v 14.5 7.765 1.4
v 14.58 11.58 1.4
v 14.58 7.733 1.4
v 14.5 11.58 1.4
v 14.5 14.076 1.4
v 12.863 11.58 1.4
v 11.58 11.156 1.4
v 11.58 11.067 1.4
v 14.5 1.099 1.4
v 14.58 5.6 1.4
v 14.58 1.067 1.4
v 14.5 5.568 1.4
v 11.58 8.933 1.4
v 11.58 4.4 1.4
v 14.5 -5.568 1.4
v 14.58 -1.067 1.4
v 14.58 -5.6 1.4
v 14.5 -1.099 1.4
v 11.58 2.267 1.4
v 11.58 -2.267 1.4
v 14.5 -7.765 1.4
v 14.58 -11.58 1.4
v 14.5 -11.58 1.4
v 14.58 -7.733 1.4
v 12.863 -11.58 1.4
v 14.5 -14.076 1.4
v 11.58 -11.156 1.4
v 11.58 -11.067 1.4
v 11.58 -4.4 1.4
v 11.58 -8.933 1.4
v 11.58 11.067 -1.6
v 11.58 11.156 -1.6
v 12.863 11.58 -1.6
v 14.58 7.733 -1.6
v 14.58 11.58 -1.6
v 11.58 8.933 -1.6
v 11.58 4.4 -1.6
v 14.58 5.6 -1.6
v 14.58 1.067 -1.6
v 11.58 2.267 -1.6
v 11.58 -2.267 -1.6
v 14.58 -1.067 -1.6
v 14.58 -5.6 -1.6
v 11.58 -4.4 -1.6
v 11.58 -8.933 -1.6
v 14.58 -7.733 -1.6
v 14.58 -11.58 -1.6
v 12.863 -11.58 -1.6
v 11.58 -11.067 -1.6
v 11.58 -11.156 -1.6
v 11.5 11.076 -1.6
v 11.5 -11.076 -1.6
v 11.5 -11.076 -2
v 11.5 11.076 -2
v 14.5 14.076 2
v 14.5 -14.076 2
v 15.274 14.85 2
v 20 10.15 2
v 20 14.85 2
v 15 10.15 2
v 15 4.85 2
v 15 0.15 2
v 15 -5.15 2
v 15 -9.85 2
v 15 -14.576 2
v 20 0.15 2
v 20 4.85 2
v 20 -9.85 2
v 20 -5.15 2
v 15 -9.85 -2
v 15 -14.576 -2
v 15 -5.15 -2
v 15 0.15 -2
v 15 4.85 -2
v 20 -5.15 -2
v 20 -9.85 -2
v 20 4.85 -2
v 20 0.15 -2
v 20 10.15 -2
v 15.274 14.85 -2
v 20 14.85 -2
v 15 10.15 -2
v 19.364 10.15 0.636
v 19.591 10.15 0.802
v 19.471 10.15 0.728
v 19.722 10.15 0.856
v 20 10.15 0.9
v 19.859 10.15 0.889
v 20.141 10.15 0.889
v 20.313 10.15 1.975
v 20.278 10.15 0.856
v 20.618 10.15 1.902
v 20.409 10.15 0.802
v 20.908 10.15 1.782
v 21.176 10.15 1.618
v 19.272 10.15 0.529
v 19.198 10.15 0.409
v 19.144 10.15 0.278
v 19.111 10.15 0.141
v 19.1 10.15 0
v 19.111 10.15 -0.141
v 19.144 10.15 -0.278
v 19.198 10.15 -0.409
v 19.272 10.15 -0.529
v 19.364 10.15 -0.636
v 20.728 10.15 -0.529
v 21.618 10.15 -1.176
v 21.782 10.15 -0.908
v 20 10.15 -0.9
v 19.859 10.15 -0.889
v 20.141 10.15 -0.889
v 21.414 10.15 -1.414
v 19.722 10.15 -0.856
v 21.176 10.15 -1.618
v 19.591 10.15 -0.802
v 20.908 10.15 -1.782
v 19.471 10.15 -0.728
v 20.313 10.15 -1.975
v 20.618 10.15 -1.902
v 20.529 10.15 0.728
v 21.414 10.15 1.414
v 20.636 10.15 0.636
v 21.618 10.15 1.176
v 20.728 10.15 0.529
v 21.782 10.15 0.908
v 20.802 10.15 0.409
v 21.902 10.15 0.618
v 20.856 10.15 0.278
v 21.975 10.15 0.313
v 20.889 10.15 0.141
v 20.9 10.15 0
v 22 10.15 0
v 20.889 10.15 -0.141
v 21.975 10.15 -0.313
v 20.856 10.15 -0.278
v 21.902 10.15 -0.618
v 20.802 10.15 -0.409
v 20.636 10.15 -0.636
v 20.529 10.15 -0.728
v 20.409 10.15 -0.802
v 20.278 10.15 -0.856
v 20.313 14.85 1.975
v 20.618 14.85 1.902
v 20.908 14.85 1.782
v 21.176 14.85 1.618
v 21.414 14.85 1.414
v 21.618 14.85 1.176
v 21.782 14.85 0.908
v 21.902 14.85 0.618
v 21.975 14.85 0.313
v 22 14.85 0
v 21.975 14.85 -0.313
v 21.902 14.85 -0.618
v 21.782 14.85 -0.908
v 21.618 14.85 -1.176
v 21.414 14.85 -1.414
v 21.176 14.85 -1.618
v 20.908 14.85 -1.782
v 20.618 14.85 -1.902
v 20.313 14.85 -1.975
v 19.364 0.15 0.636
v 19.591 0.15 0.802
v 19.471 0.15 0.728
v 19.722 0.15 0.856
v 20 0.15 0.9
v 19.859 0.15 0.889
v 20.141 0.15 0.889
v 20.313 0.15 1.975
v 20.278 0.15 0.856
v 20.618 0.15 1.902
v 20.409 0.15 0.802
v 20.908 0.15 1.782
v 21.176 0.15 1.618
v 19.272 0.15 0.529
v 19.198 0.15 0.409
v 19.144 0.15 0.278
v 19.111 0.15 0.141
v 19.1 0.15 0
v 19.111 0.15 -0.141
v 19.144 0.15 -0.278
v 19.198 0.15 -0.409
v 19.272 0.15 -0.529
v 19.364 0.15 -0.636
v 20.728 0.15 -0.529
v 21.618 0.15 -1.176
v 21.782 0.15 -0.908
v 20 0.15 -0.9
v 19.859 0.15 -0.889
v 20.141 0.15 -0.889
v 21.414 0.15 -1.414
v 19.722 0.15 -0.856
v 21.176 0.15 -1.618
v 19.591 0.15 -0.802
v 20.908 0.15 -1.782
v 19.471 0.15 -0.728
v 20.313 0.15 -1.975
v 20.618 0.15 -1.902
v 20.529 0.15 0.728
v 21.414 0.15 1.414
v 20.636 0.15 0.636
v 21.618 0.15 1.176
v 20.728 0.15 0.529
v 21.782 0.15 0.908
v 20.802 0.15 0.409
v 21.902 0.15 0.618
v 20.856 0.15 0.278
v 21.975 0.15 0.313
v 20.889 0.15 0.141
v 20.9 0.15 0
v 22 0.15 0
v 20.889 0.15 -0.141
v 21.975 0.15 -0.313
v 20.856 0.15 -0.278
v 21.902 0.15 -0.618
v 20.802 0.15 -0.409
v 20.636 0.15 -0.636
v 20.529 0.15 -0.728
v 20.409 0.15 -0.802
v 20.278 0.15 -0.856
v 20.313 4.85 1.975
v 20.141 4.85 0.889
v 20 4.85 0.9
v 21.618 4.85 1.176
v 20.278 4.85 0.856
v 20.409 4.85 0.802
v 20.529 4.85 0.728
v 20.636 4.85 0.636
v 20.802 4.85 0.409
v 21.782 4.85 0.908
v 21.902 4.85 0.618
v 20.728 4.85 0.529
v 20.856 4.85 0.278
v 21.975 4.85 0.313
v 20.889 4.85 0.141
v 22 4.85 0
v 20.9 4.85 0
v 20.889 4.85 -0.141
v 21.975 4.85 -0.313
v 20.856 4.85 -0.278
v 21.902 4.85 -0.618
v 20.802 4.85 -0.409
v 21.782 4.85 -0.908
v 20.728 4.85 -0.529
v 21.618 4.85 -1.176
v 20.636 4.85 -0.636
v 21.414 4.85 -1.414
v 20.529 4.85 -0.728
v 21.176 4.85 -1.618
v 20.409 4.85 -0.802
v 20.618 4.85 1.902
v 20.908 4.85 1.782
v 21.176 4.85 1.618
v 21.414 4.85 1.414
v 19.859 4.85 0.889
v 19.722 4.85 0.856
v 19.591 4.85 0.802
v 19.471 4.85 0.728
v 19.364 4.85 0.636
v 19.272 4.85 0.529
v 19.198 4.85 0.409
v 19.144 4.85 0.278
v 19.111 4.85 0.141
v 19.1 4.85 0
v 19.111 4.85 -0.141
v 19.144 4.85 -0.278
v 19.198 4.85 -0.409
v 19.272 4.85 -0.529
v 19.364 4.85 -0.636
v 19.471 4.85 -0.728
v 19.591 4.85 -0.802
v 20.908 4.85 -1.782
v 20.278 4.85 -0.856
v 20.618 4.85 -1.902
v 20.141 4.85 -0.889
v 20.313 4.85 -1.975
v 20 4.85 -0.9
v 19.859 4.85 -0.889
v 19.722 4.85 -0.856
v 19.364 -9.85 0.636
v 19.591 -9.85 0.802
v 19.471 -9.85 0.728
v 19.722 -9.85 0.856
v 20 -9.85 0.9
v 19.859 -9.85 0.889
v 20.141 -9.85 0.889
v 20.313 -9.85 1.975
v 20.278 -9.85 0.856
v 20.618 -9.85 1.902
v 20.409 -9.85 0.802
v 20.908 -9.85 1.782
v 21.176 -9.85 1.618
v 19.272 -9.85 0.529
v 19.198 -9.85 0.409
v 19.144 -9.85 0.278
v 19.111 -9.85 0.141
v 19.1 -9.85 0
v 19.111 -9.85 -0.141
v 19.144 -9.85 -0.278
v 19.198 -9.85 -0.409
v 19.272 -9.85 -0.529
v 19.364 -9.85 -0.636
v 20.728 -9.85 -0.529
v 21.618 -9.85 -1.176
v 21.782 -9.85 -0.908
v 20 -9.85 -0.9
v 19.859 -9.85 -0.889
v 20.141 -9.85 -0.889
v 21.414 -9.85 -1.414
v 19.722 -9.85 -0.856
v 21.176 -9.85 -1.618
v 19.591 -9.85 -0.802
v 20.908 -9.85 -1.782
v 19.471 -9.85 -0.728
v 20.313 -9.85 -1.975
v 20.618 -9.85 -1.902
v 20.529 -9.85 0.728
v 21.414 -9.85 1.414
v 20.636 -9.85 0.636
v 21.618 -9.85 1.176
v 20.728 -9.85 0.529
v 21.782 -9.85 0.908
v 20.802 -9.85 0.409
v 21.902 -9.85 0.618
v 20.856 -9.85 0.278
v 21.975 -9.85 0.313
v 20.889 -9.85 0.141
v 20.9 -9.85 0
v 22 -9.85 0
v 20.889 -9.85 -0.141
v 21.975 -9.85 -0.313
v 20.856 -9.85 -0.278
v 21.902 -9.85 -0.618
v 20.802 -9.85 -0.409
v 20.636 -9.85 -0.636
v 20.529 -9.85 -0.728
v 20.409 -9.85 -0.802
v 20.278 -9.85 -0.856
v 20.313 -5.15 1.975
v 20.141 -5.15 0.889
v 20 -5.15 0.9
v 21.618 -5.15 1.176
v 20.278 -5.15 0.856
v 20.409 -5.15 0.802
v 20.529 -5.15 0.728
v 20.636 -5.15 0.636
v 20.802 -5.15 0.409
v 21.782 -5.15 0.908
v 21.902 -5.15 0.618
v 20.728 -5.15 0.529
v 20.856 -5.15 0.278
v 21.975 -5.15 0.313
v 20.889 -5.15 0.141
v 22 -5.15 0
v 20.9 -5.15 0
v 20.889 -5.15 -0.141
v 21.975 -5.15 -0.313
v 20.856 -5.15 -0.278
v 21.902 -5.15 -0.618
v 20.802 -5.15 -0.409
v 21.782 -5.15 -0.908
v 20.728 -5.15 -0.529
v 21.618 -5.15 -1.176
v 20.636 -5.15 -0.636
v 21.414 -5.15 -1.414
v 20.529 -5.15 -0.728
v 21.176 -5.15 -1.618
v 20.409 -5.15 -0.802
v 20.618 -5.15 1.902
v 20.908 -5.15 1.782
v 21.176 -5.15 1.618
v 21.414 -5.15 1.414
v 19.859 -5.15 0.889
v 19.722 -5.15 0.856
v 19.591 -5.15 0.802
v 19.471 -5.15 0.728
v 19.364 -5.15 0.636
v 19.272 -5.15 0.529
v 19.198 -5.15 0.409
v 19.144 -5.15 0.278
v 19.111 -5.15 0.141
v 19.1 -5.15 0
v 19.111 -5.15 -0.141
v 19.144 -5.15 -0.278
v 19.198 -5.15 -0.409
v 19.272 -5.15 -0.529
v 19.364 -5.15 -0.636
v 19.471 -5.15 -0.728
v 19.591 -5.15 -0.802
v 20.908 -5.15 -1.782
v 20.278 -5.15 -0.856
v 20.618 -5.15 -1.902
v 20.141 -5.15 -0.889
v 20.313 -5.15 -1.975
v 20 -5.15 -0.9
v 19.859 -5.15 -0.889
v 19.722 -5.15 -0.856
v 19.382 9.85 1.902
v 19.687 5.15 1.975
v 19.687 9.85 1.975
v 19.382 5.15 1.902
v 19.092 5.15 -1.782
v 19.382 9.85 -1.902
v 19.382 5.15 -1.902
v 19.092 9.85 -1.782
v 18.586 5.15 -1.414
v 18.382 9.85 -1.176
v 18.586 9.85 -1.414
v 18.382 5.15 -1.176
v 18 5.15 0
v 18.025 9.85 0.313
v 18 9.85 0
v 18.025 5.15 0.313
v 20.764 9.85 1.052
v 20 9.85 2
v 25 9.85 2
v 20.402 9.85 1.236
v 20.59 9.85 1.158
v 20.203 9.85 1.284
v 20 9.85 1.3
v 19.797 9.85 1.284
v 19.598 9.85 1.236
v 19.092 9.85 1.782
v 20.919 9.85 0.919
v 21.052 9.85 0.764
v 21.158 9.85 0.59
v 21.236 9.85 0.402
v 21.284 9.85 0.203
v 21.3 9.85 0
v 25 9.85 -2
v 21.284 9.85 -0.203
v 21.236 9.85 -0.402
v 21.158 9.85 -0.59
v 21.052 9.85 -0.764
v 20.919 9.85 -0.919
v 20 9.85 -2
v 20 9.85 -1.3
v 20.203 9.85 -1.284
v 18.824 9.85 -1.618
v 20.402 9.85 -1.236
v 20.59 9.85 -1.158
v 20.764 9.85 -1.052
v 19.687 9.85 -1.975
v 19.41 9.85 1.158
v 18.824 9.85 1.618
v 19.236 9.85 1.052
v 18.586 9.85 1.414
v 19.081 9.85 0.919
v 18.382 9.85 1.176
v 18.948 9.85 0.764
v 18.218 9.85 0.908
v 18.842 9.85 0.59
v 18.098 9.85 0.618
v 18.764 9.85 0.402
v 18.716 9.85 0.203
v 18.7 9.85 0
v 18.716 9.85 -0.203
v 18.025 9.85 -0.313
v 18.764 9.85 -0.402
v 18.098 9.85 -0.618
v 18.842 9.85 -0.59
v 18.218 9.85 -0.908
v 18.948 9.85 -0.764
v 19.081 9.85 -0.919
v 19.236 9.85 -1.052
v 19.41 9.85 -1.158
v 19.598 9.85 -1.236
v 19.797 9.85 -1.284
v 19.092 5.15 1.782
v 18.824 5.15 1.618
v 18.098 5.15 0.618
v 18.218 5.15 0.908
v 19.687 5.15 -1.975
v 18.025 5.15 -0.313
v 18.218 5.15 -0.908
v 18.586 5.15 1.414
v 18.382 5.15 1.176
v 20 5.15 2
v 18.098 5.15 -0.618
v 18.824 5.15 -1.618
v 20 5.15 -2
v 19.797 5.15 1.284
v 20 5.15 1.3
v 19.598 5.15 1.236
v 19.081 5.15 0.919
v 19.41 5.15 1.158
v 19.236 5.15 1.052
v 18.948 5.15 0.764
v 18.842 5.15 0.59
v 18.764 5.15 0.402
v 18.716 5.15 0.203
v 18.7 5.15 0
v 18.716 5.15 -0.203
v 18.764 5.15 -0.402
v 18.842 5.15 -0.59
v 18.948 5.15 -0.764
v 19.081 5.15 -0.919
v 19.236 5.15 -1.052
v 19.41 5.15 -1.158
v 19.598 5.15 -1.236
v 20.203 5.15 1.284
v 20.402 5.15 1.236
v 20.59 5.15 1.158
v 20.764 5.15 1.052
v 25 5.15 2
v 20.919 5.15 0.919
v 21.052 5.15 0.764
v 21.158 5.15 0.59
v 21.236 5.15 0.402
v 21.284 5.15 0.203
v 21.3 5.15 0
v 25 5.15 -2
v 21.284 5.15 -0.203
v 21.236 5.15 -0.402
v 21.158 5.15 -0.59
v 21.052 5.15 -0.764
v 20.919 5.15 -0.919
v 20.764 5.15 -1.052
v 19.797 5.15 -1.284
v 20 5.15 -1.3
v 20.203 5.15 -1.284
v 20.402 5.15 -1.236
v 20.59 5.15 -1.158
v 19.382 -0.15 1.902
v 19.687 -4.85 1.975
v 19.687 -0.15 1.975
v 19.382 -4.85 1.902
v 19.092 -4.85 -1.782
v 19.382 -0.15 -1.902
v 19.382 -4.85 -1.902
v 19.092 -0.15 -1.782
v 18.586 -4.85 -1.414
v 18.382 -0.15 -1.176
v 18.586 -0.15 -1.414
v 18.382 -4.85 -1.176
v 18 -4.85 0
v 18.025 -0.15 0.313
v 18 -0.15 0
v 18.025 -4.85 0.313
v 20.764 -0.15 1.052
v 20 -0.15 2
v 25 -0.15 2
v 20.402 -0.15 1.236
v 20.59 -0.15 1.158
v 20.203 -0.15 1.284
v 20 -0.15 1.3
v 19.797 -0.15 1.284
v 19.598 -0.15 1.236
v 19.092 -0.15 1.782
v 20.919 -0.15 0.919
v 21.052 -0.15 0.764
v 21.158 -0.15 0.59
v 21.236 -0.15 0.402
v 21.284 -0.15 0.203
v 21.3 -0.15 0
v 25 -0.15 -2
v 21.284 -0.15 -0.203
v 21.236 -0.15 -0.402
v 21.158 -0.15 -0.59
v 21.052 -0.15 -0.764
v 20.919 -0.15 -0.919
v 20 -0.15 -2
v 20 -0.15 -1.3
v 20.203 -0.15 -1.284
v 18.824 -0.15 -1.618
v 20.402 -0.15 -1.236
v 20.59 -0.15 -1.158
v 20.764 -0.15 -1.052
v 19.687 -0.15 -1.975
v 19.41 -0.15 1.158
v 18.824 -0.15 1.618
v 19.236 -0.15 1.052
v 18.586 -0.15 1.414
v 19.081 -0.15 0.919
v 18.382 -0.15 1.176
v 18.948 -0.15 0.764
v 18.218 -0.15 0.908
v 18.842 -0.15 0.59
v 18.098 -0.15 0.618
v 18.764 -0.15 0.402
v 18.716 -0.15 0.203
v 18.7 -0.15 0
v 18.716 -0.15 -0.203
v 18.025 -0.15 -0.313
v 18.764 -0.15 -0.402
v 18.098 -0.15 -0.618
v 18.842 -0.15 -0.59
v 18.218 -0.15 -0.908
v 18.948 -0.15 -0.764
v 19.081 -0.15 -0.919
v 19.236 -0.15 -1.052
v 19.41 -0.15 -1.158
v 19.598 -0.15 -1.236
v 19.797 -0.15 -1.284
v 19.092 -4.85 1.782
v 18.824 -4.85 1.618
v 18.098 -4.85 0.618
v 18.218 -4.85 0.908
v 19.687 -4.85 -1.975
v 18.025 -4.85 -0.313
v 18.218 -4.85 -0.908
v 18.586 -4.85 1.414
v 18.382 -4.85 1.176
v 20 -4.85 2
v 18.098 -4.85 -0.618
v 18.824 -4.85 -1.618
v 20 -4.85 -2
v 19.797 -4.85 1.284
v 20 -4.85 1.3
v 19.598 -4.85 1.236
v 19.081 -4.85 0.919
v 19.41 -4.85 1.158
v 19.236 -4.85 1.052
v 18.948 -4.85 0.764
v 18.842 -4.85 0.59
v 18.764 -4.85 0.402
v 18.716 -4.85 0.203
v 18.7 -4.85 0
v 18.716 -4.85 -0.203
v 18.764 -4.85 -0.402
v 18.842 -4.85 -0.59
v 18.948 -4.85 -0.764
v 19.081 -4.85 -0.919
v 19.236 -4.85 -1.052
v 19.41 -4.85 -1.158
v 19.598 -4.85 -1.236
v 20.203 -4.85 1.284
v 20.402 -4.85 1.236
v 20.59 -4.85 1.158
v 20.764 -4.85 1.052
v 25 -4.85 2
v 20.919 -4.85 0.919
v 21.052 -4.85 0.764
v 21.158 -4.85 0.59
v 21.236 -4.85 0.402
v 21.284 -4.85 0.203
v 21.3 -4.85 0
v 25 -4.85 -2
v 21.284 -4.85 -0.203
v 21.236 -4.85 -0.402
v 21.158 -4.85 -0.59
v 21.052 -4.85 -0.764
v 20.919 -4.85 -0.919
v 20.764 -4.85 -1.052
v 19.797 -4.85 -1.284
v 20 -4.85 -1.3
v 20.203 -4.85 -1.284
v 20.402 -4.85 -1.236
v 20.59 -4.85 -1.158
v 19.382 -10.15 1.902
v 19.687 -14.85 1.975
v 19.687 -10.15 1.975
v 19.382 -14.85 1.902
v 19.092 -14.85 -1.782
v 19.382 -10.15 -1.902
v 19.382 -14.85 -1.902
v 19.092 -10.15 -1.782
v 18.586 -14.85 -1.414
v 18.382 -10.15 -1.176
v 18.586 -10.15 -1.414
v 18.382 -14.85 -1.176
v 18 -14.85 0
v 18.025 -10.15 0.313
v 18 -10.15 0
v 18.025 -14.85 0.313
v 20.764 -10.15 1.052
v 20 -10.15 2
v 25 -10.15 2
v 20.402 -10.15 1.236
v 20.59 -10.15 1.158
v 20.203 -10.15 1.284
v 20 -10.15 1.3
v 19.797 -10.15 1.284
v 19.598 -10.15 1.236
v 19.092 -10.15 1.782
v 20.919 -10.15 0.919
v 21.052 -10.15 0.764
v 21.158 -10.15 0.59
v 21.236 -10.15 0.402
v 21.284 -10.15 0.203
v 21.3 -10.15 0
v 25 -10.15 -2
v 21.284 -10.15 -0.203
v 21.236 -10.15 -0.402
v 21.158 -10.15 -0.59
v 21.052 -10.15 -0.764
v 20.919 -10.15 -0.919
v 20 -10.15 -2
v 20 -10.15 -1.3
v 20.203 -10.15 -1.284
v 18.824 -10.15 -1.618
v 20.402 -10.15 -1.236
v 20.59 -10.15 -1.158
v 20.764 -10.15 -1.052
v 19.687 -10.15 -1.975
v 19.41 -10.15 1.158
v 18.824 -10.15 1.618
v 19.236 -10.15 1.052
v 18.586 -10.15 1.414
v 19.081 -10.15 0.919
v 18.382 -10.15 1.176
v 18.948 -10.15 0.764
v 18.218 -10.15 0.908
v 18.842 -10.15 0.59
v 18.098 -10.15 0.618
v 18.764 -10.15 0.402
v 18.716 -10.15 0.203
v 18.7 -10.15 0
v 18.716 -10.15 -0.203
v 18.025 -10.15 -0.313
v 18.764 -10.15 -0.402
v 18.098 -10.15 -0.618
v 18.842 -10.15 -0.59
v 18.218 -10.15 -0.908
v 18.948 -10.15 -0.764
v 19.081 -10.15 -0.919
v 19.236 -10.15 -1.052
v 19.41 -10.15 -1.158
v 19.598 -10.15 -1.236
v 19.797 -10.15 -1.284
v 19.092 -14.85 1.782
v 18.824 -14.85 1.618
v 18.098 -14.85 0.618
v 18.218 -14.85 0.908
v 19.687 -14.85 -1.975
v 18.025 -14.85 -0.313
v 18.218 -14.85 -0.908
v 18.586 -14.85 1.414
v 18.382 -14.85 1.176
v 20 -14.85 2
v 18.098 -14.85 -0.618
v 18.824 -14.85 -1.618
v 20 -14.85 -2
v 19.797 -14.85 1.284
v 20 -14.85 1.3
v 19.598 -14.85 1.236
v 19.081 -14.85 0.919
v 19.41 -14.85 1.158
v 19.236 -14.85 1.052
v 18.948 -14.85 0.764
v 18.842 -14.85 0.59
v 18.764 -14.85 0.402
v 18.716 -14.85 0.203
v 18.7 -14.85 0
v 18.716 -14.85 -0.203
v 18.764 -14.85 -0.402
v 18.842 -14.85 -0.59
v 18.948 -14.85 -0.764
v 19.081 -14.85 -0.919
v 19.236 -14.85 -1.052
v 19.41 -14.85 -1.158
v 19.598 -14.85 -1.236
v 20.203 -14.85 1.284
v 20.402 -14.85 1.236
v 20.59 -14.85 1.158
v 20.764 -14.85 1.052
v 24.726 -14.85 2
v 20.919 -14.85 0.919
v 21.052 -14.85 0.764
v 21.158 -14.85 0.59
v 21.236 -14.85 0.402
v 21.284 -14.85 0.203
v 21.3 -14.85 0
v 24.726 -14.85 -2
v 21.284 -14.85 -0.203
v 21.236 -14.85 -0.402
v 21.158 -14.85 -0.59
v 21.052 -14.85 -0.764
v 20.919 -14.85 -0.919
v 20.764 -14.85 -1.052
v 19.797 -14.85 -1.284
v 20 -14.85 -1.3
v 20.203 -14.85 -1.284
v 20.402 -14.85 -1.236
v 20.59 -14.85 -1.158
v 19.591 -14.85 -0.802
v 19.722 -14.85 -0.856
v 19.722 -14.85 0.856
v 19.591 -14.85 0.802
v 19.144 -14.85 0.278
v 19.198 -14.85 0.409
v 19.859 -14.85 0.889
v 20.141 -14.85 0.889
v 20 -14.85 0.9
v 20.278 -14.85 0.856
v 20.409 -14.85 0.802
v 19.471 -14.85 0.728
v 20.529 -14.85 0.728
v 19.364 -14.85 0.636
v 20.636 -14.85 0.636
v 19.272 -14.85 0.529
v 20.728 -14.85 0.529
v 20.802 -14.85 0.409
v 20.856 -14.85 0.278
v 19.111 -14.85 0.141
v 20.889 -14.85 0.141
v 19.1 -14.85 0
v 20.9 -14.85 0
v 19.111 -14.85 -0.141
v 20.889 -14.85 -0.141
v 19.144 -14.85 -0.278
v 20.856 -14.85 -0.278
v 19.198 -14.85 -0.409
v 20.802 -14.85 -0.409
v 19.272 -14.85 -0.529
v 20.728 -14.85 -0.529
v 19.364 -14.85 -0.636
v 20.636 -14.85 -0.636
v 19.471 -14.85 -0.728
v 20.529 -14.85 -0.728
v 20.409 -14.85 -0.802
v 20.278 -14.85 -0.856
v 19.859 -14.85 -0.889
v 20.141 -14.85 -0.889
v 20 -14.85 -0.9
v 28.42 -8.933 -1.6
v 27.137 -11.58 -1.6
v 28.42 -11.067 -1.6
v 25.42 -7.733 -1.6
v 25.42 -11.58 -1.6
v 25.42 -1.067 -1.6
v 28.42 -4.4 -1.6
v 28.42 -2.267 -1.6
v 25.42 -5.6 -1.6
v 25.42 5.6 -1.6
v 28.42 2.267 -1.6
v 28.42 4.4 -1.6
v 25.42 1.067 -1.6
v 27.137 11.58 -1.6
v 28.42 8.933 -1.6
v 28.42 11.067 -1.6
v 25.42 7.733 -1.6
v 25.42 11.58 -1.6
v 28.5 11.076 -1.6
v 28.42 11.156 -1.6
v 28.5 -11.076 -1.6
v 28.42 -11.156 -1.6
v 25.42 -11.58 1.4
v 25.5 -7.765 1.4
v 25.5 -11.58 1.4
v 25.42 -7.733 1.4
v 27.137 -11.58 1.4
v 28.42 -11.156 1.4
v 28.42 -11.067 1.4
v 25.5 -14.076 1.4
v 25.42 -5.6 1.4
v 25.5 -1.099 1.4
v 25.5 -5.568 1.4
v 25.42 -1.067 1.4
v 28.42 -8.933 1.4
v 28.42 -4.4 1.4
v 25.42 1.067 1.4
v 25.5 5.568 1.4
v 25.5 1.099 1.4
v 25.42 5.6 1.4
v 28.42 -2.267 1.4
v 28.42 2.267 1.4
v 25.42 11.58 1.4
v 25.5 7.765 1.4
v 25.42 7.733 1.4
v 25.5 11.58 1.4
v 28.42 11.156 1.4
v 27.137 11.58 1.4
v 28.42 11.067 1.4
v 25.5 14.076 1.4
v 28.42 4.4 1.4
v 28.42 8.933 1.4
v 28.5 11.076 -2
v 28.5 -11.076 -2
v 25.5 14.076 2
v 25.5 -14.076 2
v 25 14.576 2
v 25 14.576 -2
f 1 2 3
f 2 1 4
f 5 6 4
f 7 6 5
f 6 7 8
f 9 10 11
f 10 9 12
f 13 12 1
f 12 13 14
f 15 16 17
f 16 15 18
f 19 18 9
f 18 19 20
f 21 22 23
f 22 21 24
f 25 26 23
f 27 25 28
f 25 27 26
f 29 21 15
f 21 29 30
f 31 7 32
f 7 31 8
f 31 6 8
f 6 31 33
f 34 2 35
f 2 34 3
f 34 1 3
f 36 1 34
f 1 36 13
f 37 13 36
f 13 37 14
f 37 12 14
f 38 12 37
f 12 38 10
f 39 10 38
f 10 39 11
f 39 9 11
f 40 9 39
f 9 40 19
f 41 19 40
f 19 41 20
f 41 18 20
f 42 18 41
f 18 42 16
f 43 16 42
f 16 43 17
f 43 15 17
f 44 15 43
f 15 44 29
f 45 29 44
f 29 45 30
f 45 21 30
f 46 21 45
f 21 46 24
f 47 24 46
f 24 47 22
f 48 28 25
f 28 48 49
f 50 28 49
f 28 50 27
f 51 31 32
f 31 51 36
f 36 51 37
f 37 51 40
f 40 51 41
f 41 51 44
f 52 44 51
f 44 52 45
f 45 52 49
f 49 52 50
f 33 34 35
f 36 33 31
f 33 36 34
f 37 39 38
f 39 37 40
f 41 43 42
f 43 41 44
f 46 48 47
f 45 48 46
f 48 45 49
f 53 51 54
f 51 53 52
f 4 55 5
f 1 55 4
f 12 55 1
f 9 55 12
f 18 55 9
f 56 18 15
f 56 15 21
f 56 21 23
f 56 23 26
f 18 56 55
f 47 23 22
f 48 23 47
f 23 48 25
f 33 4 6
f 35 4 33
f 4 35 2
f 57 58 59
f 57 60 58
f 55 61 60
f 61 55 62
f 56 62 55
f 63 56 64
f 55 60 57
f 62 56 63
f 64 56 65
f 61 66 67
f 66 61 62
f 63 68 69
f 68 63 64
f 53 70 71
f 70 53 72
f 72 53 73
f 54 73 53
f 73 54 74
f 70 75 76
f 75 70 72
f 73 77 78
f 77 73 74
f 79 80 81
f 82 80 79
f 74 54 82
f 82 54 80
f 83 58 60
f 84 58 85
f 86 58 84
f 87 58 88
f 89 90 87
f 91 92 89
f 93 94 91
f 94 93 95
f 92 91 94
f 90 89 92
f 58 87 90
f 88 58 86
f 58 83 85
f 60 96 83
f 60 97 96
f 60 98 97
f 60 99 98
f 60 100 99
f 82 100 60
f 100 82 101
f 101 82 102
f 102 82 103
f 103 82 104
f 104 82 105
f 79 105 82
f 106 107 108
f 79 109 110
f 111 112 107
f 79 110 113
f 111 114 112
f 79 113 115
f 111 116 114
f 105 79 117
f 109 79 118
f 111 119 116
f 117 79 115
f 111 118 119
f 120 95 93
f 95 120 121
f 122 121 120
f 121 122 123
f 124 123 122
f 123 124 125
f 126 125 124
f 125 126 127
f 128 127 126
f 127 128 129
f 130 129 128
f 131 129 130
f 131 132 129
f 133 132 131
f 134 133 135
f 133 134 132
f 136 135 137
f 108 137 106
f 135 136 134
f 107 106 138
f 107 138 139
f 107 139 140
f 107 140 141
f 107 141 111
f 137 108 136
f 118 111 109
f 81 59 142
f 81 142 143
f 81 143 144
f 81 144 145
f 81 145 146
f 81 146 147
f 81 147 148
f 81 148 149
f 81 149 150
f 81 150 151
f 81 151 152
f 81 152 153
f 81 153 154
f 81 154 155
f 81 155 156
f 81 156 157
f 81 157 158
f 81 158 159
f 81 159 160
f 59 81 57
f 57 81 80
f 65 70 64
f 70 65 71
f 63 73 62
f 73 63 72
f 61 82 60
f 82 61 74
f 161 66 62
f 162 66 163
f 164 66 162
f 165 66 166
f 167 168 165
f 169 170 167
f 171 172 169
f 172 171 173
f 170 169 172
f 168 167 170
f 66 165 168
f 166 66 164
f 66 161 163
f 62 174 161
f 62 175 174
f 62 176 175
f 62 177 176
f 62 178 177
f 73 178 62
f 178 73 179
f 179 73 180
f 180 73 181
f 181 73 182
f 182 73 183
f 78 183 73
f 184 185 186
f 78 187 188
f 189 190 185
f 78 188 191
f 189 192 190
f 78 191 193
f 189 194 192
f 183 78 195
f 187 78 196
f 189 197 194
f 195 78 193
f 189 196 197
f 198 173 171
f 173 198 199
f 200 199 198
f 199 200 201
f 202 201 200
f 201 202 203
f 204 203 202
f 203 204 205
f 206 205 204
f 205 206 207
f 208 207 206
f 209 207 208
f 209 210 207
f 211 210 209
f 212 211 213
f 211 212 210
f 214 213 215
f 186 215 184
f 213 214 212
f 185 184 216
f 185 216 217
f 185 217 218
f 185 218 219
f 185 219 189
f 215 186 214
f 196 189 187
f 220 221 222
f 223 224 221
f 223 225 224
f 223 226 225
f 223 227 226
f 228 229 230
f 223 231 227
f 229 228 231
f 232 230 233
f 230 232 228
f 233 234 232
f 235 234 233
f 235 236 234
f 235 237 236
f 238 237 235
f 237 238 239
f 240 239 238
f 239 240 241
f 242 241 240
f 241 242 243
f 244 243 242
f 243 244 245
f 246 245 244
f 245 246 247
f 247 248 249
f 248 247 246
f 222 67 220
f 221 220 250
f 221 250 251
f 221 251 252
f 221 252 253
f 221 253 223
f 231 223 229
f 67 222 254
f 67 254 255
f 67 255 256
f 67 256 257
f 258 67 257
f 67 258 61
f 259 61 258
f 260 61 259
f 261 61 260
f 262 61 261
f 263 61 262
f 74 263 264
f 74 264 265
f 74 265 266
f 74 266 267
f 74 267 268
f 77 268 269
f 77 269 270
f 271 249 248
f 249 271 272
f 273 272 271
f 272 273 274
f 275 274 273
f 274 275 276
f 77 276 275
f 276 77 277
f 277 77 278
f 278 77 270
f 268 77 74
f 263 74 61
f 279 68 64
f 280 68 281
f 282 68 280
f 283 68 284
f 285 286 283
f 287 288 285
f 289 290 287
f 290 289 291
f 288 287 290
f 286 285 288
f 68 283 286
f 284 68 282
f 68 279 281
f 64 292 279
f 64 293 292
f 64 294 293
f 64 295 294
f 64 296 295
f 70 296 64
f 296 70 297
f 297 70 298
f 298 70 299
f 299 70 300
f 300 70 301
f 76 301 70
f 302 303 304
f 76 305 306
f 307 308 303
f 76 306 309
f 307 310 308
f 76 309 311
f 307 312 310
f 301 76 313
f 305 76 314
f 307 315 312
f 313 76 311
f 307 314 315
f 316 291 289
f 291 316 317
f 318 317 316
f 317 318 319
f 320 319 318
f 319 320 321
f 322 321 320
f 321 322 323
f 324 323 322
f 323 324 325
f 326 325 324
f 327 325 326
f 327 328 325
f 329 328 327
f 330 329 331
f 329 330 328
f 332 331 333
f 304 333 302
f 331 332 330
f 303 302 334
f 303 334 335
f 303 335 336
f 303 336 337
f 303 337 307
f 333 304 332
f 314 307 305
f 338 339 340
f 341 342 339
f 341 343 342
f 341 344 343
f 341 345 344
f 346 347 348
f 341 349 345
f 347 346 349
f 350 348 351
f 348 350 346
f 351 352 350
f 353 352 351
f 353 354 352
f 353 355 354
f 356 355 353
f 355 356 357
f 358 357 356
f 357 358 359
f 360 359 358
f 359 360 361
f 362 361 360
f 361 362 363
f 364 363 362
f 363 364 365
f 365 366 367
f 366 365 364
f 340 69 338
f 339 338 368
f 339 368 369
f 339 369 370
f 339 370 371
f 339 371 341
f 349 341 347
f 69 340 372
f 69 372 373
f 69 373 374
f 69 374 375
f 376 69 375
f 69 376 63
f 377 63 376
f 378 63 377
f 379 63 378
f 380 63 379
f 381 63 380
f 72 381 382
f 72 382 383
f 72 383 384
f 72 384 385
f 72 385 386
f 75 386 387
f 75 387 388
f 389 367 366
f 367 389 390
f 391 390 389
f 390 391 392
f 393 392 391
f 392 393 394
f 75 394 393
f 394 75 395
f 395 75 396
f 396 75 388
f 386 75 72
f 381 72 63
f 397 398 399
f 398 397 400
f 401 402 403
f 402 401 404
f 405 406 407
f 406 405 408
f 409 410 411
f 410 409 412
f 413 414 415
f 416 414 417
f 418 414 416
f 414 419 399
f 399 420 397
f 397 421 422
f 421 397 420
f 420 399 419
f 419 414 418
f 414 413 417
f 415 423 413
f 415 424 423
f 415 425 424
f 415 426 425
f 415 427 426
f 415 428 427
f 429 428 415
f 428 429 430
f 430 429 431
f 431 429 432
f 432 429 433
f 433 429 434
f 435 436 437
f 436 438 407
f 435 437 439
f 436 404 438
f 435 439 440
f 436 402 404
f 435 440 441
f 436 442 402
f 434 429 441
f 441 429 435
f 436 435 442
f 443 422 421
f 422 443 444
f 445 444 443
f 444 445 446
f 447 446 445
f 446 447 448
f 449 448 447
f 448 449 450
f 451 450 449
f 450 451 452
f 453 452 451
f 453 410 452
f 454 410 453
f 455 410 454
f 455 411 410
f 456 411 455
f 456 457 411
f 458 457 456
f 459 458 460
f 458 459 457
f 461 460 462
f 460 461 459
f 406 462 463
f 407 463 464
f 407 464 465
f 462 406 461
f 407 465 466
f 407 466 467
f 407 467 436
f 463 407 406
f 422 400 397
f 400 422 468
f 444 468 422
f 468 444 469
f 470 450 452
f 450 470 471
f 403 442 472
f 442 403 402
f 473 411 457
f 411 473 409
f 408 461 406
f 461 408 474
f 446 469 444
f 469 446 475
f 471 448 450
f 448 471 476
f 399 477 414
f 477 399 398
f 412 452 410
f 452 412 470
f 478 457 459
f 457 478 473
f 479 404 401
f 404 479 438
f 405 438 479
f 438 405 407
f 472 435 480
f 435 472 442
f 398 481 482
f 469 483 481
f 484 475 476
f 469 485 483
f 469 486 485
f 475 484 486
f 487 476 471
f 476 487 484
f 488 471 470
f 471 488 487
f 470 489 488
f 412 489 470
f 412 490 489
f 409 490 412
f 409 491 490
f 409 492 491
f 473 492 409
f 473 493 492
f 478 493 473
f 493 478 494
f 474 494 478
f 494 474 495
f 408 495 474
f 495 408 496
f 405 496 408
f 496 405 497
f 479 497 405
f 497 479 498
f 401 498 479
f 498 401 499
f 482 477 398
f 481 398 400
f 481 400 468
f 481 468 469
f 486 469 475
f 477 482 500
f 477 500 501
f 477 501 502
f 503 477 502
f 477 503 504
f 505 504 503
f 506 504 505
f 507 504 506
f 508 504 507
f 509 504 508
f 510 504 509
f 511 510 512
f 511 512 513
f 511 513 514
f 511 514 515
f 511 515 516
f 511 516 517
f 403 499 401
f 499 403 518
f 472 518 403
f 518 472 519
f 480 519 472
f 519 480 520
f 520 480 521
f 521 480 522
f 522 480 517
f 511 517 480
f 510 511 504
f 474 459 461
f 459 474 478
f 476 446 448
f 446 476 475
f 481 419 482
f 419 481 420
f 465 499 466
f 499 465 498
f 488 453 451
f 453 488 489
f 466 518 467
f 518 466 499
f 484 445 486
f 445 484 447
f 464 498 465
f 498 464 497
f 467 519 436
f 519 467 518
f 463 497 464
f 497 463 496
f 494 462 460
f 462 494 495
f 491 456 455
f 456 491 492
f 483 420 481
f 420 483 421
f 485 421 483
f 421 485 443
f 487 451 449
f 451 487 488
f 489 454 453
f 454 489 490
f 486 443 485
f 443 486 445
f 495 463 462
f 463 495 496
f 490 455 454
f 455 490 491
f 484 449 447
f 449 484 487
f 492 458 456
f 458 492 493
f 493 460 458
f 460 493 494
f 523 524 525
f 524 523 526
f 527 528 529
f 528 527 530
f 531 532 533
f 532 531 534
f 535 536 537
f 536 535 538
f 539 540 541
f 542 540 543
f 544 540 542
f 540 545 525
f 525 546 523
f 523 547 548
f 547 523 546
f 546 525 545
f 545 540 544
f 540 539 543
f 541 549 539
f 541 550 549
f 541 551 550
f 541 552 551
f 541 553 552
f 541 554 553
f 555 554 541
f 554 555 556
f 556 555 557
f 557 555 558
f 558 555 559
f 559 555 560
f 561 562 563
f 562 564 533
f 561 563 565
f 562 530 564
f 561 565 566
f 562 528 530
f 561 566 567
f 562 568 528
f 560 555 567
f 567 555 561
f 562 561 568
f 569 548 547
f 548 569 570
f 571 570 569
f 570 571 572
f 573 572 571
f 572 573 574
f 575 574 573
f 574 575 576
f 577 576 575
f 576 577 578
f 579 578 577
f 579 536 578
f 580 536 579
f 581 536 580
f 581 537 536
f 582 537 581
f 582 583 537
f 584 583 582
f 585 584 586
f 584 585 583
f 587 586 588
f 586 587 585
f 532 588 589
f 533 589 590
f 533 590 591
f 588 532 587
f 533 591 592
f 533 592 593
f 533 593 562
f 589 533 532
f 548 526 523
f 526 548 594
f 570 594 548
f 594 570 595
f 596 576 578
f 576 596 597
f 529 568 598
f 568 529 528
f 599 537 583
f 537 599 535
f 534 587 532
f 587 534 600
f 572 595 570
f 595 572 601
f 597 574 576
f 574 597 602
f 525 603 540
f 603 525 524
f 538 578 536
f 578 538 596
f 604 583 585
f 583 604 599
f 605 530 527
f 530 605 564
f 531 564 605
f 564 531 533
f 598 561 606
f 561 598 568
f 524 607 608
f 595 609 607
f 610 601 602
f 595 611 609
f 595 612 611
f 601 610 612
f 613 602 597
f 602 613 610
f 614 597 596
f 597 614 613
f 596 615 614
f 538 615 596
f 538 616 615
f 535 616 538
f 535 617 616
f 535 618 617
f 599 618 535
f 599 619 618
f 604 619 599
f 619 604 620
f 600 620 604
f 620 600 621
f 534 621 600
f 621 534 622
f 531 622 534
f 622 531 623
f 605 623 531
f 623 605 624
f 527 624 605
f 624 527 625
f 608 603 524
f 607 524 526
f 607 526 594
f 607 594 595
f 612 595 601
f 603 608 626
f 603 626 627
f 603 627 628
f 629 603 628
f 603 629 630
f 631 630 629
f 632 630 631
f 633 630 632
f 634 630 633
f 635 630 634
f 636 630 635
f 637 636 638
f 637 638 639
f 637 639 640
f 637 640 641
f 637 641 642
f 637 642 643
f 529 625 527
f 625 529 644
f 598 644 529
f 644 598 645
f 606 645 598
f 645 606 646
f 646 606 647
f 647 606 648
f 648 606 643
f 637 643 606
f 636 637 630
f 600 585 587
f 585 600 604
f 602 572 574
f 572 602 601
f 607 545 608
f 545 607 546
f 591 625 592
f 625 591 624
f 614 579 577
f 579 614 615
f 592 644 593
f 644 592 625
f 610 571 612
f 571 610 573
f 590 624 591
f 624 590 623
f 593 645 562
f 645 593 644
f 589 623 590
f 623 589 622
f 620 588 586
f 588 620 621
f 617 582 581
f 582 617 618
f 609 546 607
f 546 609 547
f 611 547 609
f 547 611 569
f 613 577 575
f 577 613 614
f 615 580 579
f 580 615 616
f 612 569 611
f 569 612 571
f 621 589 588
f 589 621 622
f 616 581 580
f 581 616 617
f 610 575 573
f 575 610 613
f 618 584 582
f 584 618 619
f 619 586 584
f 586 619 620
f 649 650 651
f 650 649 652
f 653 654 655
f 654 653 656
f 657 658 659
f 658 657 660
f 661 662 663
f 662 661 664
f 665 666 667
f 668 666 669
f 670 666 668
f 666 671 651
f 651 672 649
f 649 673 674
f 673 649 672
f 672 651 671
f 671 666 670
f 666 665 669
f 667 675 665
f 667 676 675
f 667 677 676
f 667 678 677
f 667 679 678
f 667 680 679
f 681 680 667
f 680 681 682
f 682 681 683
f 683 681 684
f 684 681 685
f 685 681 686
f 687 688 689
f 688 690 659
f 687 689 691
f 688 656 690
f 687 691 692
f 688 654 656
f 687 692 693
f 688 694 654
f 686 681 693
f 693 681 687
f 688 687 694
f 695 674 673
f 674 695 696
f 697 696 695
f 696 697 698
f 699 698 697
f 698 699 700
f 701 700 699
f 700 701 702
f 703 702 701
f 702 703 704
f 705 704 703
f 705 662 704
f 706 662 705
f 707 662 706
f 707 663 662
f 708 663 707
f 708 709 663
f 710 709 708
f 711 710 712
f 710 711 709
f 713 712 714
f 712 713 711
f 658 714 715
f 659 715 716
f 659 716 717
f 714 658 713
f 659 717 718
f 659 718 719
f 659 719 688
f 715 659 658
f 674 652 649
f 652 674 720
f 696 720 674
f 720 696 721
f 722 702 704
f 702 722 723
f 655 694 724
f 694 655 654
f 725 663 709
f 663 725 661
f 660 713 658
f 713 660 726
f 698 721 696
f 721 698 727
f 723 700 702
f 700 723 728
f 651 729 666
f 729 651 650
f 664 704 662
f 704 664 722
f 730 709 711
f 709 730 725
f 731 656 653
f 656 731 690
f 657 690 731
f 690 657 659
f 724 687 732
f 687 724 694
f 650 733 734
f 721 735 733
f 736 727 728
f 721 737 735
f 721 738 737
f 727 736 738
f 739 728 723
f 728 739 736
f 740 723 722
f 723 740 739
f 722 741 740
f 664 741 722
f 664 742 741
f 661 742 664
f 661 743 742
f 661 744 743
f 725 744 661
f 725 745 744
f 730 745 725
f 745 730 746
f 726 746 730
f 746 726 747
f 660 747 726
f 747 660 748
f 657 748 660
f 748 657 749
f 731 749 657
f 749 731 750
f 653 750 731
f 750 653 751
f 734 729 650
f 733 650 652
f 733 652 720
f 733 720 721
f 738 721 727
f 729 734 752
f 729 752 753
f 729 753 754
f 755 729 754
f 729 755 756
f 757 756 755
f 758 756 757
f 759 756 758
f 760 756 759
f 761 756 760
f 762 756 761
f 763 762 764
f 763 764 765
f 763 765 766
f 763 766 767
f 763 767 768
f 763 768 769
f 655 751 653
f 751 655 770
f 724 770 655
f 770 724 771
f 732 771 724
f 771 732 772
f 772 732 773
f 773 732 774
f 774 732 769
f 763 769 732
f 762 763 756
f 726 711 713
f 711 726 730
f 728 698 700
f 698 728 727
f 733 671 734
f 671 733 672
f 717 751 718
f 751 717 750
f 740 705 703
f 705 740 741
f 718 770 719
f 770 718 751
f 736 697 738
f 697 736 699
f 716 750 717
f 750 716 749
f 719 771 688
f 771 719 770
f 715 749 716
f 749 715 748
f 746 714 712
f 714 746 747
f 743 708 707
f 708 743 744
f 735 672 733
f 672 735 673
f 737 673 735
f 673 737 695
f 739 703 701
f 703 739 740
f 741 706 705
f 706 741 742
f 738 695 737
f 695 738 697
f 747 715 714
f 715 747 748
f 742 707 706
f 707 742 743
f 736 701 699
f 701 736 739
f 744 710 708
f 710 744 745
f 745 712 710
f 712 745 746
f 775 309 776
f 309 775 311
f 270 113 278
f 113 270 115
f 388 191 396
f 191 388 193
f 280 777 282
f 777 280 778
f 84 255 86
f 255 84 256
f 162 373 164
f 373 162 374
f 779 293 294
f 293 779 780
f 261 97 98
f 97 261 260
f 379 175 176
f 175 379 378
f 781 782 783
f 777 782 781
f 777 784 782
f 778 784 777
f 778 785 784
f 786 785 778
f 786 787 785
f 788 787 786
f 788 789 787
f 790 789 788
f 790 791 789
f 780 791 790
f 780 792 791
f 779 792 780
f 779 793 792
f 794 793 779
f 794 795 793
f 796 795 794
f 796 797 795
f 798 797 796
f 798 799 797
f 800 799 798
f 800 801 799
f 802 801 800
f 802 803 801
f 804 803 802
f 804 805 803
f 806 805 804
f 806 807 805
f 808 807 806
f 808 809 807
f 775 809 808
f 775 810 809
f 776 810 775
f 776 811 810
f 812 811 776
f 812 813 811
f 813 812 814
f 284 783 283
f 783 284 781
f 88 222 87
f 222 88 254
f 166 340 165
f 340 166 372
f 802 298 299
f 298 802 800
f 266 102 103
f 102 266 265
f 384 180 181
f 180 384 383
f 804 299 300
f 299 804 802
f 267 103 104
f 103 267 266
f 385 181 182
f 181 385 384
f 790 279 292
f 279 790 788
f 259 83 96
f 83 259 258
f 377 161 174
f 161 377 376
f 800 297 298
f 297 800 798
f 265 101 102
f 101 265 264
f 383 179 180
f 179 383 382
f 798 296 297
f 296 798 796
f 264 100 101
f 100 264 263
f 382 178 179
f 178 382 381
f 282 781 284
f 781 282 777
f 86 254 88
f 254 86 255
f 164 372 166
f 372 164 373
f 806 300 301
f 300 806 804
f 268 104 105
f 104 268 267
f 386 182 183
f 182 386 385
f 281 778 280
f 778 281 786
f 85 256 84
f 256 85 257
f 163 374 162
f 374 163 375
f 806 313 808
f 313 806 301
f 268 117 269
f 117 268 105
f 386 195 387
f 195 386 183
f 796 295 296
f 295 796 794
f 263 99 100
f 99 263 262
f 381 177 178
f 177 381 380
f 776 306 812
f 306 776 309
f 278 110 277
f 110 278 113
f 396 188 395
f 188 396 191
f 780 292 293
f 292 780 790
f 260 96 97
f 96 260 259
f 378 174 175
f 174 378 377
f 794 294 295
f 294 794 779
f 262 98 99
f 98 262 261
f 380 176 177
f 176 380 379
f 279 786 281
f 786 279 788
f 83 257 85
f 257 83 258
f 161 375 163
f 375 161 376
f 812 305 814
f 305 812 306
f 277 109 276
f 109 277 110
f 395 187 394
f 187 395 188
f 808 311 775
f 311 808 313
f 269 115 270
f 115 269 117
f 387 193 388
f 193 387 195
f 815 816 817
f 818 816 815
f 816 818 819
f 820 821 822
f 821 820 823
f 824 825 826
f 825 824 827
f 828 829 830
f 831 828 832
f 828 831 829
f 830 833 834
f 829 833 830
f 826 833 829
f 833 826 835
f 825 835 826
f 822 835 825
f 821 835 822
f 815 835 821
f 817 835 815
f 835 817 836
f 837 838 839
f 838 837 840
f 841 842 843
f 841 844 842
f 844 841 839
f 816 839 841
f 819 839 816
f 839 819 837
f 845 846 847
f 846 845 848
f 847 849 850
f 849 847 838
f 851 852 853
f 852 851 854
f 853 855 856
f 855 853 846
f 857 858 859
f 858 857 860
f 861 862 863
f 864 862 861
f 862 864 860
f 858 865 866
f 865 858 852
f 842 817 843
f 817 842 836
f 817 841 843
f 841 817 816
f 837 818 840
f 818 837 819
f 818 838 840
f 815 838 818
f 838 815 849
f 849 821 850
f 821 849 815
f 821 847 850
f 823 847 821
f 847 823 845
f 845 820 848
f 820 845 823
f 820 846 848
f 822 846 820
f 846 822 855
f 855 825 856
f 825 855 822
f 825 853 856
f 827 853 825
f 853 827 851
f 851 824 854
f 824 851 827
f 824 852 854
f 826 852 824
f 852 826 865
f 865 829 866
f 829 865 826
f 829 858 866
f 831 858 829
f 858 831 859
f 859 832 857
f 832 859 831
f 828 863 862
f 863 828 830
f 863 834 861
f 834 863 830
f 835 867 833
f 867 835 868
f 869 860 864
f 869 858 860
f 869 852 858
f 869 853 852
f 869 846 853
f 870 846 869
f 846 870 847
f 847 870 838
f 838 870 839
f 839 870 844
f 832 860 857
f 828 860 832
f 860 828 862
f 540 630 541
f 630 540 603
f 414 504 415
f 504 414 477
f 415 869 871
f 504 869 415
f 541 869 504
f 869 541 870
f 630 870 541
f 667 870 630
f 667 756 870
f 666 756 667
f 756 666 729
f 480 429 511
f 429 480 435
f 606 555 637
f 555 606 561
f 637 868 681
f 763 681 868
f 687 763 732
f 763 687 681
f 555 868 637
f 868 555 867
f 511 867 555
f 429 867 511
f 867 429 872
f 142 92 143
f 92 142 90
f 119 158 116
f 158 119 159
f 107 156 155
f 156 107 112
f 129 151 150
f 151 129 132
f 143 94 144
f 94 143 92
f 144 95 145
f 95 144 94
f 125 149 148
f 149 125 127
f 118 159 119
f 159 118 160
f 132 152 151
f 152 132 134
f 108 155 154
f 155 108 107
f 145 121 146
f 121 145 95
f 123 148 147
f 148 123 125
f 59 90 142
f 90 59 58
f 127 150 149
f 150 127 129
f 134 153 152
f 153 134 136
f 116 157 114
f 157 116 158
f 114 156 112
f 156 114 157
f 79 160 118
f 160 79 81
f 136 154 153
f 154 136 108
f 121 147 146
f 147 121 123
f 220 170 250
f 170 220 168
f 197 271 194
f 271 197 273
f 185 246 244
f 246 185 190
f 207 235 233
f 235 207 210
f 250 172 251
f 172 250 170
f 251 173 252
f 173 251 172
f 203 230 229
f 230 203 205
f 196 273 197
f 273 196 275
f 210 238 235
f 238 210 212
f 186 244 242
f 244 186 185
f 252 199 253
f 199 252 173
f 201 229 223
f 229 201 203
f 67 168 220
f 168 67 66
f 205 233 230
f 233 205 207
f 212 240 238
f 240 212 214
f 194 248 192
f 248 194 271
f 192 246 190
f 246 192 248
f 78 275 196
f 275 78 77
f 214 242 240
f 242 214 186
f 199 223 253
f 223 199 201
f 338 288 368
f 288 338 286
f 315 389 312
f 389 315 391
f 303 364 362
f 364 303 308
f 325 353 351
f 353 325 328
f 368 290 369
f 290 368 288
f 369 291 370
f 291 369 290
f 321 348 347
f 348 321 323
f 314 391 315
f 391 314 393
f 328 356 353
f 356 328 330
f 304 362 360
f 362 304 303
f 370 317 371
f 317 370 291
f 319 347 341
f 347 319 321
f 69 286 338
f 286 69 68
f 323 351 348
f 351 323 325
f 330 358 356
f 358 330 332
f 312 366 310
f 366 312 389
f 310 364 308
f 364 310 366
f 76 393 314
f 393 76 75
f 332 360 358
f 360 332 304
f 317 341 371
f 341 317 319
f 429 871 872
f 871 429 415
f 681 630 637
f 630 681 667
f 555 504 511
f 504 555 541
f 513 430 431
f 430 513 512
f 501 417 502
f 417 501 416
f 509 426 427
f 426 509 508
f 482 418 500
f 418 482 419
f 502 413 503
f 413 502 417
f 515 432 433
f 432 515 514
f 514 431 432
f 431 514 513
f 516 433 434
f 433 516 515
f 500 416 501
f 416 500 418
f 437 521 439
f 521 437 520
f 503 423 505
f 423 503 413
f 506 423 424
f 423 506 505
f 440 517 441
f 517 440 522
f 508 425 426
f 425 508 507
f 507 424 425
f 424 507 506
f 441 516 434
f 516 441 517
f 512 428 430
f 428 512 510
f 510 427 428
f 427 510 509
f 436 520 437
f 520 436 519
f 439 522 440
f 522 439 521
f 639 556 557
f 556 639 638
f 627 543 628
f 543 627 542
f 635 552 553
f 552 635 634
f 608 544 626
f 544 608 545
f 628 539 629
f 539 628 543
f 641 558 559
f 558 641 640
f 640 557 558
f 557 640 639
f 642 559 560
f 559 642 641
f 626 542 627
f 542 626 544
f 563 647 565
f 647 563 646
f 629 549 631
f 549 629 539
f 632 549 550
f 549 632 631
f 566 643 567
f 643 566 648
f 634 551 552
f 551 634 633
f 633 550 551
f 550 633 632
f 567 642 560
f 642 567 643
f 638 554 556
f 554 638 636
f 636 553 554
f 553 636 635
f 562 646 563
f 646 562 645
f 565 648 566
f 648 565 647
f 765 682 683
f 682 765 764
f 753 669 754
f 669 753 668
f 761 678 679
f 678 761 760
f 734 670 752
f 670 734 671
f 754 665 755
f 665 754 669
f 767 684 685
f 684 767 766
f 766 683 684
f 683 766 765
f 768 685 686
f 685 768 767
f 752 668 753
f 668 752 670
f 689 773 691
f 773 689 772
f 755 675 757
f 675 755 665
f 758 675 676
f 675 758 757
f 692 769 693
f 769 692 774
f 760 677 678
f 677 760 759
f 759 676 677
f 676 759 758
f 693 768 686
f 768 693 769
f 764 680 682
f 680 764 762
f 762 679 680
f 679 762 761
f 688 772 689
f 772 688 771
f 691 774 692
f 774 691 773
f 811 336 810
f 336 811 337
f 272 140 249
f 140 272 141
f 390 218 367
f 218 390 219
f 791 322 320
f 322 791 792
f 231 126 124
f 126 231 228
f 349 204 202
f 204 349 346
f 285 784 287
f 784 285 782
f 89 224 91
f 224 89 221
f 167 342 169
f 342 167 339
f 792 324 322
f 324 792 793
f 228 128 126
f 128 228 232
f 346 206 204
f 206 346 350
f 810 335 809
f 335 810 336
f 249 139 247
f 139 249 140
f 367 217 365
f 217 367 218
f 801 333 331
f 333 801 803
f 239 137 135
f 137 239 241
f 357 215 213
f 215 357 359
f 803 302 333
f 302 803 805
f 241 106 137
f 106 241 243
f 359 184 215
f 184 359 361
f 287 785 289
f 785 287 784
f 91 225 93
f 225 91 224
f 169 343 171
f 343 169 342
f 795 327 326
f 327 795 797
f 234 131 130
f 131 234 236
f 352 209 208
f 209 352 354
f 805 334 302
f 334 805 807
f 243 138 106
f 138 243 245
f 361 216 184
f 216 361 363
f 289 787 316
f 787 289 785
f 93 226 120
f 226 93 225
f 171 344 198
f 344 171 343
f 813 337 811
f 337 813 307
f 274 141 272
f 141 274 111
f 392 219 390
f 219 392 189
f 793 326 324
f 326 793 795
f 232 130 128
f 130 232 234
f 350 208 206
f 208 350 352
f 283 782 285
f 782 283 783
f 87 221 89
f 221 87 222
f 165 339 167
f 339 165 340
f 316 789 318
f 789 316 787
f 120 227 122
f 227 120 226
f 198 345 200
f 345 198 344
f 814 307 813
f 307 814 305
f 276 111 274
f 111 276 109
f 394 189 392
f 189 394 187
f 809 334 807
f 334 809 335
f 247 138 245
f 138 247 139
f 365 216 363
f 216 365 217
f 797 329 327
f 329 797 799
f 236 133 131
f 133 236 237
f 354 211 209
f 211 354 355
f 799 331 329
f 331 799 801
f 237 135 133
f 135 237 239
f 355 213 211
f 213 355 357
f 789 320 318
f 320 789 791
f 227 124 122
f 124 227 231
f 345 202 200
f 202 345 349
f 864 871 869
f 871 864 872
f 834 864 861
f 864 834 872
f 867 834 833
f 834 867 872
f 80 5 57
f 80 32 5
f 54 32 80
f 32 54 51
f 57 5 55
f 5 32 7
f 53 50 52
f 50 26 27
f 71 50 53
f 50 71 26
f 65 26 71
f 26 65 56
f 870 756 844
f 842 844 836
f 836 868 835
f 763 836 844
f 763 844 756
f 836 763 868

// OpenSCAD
// file: hinge.scad
$fn = 40;

hinge_gap = 0.3;
hinge_hole_d = 2.6;
hinge_rod_d = 1.8;

module hinge_hole_piece(width, depth, thickness) {
    h = width - hinge_gap;
    difference() {
        hinge_rod_piece(width, depth, thickness);
        rotate([0,90,0])
        cylinder(d=hinge_hole_d, h=width+1, center=true);
    }
}

module hinge_rod_piece(width, depth, thickness) {
    h = width - hinge_gap;
    rotate([0,90,0]) {
        cylinder(d=thickness, h=h, center=true);
        translate([-thickness/2,0,-h/2])
        cube([thickness, depth, h]);
    }
}

module hinge_rod(width) {
    h = width - hinge_gap;
    rotate([0,90,0])
    cylinder(d=hinge_rod_d, h=h, center=true);
}

module hinge(width, depth, thickness, n) {
    unit_width = width/n;
    shift = width/2 - unit_width/2;
    for (i=[0:2:n-1]) {
        translate([i*unit_width - shift,0,0])
        hinge_rod_piece(unit_width, depth, thickness);
    }
    for (i=[1:2:n-1]) {
        translate([i*unit_width - shift,0,0])
        rotate(180)
        hinge_hole_piece(unit_width, depth, thickness);
    }
    hinge_rod(width);
}

intersection() {
    translate([0,0,-100])
    cube(200, center=true);
    union() {
        for (y=[-8,8]) translate([0,y,0])
        cube([30, 5, 4], center=true);
        hinge(30, 6, 4, 6);
    }
}
// file: magnet.scad
magnet_width = 5;
magnet_height = 2.5;
magnet_depth = 1.5;
magnet_gap = .4;
magnet_wall = .8;
magnet_cover = .7;

module magnet_hole(p, q, thickness) {
    x = (q-p) / norm(q-p);
    y = [-x[1], x[0]];
    a = -90 + atan2(-x[0], x[1]);
    v = (p+q) / 2;
    width = magnet_width + magnet_gap + 2*magnet_wall;
    depth = magnet_depth + magnet_gap + magnet_wall;
    height = magnet_height + magnet_gap + magnet_cover;
    translate(v)
    rotate(a)
    translate([-width/2, 0.8,  thickness - height + 0.01])
    cube([width, depth, height]);
}

module magnet_holder() {
    width = magnet_width + magnet_gap + 2*magnet_wall;
    depth = magnet_depth + magnet_gap + magnet_wall;
    height = magnet_height + magnet_gap + magnet_cover;
    difference() {
        cube([width, depth, height-.2]);
        translate([magnet_wall, -0.01, magnet_cover])
        cube([width-2*magnet_wall, depth-magnet_wall, height]);
        translate([0,0,5/sqrt(2)+height/2])
        rotate([45,0,0])
        cube([100,5,5], center=true);
    }
}

module magnet_cut_outs(edges, thickness) {
    difference() {
        children();
        translate([0,0,-thickness/2])
        for (edge=edges) magnet_hole(edge[0], edge[1], thickness);
    }
}

A = [-20, 0];
B = [10, 10];
C = [0, -10];
magnet_cut_outs([[A,B],[B,C],[C,A]],4)
linear_extrude(4)
polygon([A, B, C]);

for (y=[0,5,10])
translate([10,-y,0])
magnet_holder();
// file: geometry.scad
module cut_through(a_2d, b_2d) {
    v = b_2d - a_2d;
    intersection() {
        translate(a_2d)
        rotate(atan2(-v[0], v[1]))
        translate([100,0,0])
        cube([200,200,10], center=true);
        children();
    }
}

function along(p, q, ratio) = p + ratio * (q-p);

function triangle_points(edge_length) = 
    let(a = edge_length/2, rho = edge_length*sqrt(3)/6) 
    [[-a,-rho], [a,-rho], [0,2*rho]];

function line_line(a,b, p,q) = 
    along(a, b, cross(a-p,p-q)/cross(a-b,p-q));
// file: hinged_square.scad
use <hinge.scad>

module hinged_square(
    edge_length, depth, thickness, hinge_n, flip) {
    for (i=[0,1,2,3]) {
        rotate(90*i)
        translate([0, -edge_length/2, 0])
        rotate(180*flip)
        hinge(
            width=edge_length - 2 * depth, 
            depth=depth, 
            thickness=thickness, 
            n=hinge_n);
    }
    cube([
        edge_length-2*depth, 
        edge_length-2*depth, 
        thickness], center=true);
}
// file: dovetail.scad
dovetail_tension = 0.08;
dovetail_shape = 0.4;
dovetail_depth = 3;
dovetail_lower_cover = 0.4;
dovetail_upper_cover = 0.6;

function shift(pt, vec) = [for (p = vec) p + pt];

function zig(start_x, width) =
    let(
        a = width/4, 
        d = -dovetail_depth,
        s = dovetail_depth * dovetail_shape / 2
    )
    shift(
        [start_x, dovetail_tension],
        [[0,0],[a+s, 0],[a-s, d],[3*a+s, d],[3*a-s, 0]]
    );

function zag(start_x, width) =
    let(
        a = width/4, 
        d = -dovetail_depth,
        s = dovetail_depth * dovetail_shape / 2
    )
    shift(
        [start_x, dovetail_tension],
        [[0,d],[a+s, d],[a-s, 0],[3*a+s, 0],[3*a-s, d]]
    );

function zigzag(start_x, width, zig_or_zag) =
    zig_or_zag ? zig(start_x, width) : zag(start_x, width);

module dovetail(width, n, thickness, zig_or_zag) {
    h = thickness - dovetail_upper_cover;
    unit = width / n;
    translate([-width/2, dovetail_depth/2, -thickness/2]) {
        linear_extrude(h)
        polygon(
            [for (i=[0:n-1]) 
                each(zigzag(unit*i, unit, zig_or_zag)),
             [width, 0], [width, width], [0,width]]);
        translate([0, -dovetail_depth, -10])
        cube([width, width + dovetail_depth, dovetail_lower_cover + 10]);
        translate([0,0,h])
        cube([width, width, dovetail_upper_cover + 10]);
    }
}

intersection_for (y=[0,1]) mirror([0,y,0])
translate([0,8,0])
rotate([180,0,0])
dovetail(100, 10, 4);
// main file
use <dovetail.scad>
use <hinged_square.scad>
use <geometry.scad>
use <magnet.scad>

$fn = 40;

thickness = 4;
depth = 5;
edge_length = 40;

dovetail_n = 6;
hinge_n = 6;

module face(flip) {
    intersection() {
        hinged_square(
            edge_length=edge_length, 
            depth=depth, 
            thickness=thickness,
            hinge_n=hinge_n,
            flip=flip);
        cube(edge_length, center=true);
    }
}

module inner_dovetail_piece() {
    translate([0, 2+depth-edge_length/2, 0])
    dovetail(
        width=edge_length, 
        n=dovetail_n, 
        thickness=thickness,
        zig_or_zag=true);
}

module outer_dovetail_piece() {
    translate([0, 2+depth-edge_length/2, 0])
    rotate([180,0,0])
    dovetail(
        width=edge_length, 
        n=dovetail_n, 
        thickness=thickness,
        zig_or_zag=false);    
}

module all_inner_dovetails() {
    intersection_for(a=[90:90:360]) 
        rotate(a) inner_dovetail_piece();
}

module all_outer_dovetails() {
    for(a=[90:90:360]) 
        rotate(a) outer_dovetail_piece();
}

module inner() {
    intersection() {
        all_inner_dovetails();
        children();
    }
}

module outer() {
    intersection() {
        all_outer_dovetails();
        children();
    }
}

e = edge_length/2;
A = [-e,-e];
B = [e,-e];
C = [e,e];

module piece() {
    magnet_cut_outs([[A,C]], thickness)
    intersection() {
        linear_extrude(2*thickness, center=true)
        polygon([A,B,C]);
        inner() face(0);
    }
}

module conn() {
    rotate([180,0,0])
    intersection() {
        for (x=[0, 1])
            translate([x * edge_length,0,0])
            outer() face(x);
        linear_extrude(2*thickness, center=true)
        offset(-.3)  // corner relief
        polygon([[0,0],[e,e],[2*e,0],[e,-e]]);
    }
}


conn();
